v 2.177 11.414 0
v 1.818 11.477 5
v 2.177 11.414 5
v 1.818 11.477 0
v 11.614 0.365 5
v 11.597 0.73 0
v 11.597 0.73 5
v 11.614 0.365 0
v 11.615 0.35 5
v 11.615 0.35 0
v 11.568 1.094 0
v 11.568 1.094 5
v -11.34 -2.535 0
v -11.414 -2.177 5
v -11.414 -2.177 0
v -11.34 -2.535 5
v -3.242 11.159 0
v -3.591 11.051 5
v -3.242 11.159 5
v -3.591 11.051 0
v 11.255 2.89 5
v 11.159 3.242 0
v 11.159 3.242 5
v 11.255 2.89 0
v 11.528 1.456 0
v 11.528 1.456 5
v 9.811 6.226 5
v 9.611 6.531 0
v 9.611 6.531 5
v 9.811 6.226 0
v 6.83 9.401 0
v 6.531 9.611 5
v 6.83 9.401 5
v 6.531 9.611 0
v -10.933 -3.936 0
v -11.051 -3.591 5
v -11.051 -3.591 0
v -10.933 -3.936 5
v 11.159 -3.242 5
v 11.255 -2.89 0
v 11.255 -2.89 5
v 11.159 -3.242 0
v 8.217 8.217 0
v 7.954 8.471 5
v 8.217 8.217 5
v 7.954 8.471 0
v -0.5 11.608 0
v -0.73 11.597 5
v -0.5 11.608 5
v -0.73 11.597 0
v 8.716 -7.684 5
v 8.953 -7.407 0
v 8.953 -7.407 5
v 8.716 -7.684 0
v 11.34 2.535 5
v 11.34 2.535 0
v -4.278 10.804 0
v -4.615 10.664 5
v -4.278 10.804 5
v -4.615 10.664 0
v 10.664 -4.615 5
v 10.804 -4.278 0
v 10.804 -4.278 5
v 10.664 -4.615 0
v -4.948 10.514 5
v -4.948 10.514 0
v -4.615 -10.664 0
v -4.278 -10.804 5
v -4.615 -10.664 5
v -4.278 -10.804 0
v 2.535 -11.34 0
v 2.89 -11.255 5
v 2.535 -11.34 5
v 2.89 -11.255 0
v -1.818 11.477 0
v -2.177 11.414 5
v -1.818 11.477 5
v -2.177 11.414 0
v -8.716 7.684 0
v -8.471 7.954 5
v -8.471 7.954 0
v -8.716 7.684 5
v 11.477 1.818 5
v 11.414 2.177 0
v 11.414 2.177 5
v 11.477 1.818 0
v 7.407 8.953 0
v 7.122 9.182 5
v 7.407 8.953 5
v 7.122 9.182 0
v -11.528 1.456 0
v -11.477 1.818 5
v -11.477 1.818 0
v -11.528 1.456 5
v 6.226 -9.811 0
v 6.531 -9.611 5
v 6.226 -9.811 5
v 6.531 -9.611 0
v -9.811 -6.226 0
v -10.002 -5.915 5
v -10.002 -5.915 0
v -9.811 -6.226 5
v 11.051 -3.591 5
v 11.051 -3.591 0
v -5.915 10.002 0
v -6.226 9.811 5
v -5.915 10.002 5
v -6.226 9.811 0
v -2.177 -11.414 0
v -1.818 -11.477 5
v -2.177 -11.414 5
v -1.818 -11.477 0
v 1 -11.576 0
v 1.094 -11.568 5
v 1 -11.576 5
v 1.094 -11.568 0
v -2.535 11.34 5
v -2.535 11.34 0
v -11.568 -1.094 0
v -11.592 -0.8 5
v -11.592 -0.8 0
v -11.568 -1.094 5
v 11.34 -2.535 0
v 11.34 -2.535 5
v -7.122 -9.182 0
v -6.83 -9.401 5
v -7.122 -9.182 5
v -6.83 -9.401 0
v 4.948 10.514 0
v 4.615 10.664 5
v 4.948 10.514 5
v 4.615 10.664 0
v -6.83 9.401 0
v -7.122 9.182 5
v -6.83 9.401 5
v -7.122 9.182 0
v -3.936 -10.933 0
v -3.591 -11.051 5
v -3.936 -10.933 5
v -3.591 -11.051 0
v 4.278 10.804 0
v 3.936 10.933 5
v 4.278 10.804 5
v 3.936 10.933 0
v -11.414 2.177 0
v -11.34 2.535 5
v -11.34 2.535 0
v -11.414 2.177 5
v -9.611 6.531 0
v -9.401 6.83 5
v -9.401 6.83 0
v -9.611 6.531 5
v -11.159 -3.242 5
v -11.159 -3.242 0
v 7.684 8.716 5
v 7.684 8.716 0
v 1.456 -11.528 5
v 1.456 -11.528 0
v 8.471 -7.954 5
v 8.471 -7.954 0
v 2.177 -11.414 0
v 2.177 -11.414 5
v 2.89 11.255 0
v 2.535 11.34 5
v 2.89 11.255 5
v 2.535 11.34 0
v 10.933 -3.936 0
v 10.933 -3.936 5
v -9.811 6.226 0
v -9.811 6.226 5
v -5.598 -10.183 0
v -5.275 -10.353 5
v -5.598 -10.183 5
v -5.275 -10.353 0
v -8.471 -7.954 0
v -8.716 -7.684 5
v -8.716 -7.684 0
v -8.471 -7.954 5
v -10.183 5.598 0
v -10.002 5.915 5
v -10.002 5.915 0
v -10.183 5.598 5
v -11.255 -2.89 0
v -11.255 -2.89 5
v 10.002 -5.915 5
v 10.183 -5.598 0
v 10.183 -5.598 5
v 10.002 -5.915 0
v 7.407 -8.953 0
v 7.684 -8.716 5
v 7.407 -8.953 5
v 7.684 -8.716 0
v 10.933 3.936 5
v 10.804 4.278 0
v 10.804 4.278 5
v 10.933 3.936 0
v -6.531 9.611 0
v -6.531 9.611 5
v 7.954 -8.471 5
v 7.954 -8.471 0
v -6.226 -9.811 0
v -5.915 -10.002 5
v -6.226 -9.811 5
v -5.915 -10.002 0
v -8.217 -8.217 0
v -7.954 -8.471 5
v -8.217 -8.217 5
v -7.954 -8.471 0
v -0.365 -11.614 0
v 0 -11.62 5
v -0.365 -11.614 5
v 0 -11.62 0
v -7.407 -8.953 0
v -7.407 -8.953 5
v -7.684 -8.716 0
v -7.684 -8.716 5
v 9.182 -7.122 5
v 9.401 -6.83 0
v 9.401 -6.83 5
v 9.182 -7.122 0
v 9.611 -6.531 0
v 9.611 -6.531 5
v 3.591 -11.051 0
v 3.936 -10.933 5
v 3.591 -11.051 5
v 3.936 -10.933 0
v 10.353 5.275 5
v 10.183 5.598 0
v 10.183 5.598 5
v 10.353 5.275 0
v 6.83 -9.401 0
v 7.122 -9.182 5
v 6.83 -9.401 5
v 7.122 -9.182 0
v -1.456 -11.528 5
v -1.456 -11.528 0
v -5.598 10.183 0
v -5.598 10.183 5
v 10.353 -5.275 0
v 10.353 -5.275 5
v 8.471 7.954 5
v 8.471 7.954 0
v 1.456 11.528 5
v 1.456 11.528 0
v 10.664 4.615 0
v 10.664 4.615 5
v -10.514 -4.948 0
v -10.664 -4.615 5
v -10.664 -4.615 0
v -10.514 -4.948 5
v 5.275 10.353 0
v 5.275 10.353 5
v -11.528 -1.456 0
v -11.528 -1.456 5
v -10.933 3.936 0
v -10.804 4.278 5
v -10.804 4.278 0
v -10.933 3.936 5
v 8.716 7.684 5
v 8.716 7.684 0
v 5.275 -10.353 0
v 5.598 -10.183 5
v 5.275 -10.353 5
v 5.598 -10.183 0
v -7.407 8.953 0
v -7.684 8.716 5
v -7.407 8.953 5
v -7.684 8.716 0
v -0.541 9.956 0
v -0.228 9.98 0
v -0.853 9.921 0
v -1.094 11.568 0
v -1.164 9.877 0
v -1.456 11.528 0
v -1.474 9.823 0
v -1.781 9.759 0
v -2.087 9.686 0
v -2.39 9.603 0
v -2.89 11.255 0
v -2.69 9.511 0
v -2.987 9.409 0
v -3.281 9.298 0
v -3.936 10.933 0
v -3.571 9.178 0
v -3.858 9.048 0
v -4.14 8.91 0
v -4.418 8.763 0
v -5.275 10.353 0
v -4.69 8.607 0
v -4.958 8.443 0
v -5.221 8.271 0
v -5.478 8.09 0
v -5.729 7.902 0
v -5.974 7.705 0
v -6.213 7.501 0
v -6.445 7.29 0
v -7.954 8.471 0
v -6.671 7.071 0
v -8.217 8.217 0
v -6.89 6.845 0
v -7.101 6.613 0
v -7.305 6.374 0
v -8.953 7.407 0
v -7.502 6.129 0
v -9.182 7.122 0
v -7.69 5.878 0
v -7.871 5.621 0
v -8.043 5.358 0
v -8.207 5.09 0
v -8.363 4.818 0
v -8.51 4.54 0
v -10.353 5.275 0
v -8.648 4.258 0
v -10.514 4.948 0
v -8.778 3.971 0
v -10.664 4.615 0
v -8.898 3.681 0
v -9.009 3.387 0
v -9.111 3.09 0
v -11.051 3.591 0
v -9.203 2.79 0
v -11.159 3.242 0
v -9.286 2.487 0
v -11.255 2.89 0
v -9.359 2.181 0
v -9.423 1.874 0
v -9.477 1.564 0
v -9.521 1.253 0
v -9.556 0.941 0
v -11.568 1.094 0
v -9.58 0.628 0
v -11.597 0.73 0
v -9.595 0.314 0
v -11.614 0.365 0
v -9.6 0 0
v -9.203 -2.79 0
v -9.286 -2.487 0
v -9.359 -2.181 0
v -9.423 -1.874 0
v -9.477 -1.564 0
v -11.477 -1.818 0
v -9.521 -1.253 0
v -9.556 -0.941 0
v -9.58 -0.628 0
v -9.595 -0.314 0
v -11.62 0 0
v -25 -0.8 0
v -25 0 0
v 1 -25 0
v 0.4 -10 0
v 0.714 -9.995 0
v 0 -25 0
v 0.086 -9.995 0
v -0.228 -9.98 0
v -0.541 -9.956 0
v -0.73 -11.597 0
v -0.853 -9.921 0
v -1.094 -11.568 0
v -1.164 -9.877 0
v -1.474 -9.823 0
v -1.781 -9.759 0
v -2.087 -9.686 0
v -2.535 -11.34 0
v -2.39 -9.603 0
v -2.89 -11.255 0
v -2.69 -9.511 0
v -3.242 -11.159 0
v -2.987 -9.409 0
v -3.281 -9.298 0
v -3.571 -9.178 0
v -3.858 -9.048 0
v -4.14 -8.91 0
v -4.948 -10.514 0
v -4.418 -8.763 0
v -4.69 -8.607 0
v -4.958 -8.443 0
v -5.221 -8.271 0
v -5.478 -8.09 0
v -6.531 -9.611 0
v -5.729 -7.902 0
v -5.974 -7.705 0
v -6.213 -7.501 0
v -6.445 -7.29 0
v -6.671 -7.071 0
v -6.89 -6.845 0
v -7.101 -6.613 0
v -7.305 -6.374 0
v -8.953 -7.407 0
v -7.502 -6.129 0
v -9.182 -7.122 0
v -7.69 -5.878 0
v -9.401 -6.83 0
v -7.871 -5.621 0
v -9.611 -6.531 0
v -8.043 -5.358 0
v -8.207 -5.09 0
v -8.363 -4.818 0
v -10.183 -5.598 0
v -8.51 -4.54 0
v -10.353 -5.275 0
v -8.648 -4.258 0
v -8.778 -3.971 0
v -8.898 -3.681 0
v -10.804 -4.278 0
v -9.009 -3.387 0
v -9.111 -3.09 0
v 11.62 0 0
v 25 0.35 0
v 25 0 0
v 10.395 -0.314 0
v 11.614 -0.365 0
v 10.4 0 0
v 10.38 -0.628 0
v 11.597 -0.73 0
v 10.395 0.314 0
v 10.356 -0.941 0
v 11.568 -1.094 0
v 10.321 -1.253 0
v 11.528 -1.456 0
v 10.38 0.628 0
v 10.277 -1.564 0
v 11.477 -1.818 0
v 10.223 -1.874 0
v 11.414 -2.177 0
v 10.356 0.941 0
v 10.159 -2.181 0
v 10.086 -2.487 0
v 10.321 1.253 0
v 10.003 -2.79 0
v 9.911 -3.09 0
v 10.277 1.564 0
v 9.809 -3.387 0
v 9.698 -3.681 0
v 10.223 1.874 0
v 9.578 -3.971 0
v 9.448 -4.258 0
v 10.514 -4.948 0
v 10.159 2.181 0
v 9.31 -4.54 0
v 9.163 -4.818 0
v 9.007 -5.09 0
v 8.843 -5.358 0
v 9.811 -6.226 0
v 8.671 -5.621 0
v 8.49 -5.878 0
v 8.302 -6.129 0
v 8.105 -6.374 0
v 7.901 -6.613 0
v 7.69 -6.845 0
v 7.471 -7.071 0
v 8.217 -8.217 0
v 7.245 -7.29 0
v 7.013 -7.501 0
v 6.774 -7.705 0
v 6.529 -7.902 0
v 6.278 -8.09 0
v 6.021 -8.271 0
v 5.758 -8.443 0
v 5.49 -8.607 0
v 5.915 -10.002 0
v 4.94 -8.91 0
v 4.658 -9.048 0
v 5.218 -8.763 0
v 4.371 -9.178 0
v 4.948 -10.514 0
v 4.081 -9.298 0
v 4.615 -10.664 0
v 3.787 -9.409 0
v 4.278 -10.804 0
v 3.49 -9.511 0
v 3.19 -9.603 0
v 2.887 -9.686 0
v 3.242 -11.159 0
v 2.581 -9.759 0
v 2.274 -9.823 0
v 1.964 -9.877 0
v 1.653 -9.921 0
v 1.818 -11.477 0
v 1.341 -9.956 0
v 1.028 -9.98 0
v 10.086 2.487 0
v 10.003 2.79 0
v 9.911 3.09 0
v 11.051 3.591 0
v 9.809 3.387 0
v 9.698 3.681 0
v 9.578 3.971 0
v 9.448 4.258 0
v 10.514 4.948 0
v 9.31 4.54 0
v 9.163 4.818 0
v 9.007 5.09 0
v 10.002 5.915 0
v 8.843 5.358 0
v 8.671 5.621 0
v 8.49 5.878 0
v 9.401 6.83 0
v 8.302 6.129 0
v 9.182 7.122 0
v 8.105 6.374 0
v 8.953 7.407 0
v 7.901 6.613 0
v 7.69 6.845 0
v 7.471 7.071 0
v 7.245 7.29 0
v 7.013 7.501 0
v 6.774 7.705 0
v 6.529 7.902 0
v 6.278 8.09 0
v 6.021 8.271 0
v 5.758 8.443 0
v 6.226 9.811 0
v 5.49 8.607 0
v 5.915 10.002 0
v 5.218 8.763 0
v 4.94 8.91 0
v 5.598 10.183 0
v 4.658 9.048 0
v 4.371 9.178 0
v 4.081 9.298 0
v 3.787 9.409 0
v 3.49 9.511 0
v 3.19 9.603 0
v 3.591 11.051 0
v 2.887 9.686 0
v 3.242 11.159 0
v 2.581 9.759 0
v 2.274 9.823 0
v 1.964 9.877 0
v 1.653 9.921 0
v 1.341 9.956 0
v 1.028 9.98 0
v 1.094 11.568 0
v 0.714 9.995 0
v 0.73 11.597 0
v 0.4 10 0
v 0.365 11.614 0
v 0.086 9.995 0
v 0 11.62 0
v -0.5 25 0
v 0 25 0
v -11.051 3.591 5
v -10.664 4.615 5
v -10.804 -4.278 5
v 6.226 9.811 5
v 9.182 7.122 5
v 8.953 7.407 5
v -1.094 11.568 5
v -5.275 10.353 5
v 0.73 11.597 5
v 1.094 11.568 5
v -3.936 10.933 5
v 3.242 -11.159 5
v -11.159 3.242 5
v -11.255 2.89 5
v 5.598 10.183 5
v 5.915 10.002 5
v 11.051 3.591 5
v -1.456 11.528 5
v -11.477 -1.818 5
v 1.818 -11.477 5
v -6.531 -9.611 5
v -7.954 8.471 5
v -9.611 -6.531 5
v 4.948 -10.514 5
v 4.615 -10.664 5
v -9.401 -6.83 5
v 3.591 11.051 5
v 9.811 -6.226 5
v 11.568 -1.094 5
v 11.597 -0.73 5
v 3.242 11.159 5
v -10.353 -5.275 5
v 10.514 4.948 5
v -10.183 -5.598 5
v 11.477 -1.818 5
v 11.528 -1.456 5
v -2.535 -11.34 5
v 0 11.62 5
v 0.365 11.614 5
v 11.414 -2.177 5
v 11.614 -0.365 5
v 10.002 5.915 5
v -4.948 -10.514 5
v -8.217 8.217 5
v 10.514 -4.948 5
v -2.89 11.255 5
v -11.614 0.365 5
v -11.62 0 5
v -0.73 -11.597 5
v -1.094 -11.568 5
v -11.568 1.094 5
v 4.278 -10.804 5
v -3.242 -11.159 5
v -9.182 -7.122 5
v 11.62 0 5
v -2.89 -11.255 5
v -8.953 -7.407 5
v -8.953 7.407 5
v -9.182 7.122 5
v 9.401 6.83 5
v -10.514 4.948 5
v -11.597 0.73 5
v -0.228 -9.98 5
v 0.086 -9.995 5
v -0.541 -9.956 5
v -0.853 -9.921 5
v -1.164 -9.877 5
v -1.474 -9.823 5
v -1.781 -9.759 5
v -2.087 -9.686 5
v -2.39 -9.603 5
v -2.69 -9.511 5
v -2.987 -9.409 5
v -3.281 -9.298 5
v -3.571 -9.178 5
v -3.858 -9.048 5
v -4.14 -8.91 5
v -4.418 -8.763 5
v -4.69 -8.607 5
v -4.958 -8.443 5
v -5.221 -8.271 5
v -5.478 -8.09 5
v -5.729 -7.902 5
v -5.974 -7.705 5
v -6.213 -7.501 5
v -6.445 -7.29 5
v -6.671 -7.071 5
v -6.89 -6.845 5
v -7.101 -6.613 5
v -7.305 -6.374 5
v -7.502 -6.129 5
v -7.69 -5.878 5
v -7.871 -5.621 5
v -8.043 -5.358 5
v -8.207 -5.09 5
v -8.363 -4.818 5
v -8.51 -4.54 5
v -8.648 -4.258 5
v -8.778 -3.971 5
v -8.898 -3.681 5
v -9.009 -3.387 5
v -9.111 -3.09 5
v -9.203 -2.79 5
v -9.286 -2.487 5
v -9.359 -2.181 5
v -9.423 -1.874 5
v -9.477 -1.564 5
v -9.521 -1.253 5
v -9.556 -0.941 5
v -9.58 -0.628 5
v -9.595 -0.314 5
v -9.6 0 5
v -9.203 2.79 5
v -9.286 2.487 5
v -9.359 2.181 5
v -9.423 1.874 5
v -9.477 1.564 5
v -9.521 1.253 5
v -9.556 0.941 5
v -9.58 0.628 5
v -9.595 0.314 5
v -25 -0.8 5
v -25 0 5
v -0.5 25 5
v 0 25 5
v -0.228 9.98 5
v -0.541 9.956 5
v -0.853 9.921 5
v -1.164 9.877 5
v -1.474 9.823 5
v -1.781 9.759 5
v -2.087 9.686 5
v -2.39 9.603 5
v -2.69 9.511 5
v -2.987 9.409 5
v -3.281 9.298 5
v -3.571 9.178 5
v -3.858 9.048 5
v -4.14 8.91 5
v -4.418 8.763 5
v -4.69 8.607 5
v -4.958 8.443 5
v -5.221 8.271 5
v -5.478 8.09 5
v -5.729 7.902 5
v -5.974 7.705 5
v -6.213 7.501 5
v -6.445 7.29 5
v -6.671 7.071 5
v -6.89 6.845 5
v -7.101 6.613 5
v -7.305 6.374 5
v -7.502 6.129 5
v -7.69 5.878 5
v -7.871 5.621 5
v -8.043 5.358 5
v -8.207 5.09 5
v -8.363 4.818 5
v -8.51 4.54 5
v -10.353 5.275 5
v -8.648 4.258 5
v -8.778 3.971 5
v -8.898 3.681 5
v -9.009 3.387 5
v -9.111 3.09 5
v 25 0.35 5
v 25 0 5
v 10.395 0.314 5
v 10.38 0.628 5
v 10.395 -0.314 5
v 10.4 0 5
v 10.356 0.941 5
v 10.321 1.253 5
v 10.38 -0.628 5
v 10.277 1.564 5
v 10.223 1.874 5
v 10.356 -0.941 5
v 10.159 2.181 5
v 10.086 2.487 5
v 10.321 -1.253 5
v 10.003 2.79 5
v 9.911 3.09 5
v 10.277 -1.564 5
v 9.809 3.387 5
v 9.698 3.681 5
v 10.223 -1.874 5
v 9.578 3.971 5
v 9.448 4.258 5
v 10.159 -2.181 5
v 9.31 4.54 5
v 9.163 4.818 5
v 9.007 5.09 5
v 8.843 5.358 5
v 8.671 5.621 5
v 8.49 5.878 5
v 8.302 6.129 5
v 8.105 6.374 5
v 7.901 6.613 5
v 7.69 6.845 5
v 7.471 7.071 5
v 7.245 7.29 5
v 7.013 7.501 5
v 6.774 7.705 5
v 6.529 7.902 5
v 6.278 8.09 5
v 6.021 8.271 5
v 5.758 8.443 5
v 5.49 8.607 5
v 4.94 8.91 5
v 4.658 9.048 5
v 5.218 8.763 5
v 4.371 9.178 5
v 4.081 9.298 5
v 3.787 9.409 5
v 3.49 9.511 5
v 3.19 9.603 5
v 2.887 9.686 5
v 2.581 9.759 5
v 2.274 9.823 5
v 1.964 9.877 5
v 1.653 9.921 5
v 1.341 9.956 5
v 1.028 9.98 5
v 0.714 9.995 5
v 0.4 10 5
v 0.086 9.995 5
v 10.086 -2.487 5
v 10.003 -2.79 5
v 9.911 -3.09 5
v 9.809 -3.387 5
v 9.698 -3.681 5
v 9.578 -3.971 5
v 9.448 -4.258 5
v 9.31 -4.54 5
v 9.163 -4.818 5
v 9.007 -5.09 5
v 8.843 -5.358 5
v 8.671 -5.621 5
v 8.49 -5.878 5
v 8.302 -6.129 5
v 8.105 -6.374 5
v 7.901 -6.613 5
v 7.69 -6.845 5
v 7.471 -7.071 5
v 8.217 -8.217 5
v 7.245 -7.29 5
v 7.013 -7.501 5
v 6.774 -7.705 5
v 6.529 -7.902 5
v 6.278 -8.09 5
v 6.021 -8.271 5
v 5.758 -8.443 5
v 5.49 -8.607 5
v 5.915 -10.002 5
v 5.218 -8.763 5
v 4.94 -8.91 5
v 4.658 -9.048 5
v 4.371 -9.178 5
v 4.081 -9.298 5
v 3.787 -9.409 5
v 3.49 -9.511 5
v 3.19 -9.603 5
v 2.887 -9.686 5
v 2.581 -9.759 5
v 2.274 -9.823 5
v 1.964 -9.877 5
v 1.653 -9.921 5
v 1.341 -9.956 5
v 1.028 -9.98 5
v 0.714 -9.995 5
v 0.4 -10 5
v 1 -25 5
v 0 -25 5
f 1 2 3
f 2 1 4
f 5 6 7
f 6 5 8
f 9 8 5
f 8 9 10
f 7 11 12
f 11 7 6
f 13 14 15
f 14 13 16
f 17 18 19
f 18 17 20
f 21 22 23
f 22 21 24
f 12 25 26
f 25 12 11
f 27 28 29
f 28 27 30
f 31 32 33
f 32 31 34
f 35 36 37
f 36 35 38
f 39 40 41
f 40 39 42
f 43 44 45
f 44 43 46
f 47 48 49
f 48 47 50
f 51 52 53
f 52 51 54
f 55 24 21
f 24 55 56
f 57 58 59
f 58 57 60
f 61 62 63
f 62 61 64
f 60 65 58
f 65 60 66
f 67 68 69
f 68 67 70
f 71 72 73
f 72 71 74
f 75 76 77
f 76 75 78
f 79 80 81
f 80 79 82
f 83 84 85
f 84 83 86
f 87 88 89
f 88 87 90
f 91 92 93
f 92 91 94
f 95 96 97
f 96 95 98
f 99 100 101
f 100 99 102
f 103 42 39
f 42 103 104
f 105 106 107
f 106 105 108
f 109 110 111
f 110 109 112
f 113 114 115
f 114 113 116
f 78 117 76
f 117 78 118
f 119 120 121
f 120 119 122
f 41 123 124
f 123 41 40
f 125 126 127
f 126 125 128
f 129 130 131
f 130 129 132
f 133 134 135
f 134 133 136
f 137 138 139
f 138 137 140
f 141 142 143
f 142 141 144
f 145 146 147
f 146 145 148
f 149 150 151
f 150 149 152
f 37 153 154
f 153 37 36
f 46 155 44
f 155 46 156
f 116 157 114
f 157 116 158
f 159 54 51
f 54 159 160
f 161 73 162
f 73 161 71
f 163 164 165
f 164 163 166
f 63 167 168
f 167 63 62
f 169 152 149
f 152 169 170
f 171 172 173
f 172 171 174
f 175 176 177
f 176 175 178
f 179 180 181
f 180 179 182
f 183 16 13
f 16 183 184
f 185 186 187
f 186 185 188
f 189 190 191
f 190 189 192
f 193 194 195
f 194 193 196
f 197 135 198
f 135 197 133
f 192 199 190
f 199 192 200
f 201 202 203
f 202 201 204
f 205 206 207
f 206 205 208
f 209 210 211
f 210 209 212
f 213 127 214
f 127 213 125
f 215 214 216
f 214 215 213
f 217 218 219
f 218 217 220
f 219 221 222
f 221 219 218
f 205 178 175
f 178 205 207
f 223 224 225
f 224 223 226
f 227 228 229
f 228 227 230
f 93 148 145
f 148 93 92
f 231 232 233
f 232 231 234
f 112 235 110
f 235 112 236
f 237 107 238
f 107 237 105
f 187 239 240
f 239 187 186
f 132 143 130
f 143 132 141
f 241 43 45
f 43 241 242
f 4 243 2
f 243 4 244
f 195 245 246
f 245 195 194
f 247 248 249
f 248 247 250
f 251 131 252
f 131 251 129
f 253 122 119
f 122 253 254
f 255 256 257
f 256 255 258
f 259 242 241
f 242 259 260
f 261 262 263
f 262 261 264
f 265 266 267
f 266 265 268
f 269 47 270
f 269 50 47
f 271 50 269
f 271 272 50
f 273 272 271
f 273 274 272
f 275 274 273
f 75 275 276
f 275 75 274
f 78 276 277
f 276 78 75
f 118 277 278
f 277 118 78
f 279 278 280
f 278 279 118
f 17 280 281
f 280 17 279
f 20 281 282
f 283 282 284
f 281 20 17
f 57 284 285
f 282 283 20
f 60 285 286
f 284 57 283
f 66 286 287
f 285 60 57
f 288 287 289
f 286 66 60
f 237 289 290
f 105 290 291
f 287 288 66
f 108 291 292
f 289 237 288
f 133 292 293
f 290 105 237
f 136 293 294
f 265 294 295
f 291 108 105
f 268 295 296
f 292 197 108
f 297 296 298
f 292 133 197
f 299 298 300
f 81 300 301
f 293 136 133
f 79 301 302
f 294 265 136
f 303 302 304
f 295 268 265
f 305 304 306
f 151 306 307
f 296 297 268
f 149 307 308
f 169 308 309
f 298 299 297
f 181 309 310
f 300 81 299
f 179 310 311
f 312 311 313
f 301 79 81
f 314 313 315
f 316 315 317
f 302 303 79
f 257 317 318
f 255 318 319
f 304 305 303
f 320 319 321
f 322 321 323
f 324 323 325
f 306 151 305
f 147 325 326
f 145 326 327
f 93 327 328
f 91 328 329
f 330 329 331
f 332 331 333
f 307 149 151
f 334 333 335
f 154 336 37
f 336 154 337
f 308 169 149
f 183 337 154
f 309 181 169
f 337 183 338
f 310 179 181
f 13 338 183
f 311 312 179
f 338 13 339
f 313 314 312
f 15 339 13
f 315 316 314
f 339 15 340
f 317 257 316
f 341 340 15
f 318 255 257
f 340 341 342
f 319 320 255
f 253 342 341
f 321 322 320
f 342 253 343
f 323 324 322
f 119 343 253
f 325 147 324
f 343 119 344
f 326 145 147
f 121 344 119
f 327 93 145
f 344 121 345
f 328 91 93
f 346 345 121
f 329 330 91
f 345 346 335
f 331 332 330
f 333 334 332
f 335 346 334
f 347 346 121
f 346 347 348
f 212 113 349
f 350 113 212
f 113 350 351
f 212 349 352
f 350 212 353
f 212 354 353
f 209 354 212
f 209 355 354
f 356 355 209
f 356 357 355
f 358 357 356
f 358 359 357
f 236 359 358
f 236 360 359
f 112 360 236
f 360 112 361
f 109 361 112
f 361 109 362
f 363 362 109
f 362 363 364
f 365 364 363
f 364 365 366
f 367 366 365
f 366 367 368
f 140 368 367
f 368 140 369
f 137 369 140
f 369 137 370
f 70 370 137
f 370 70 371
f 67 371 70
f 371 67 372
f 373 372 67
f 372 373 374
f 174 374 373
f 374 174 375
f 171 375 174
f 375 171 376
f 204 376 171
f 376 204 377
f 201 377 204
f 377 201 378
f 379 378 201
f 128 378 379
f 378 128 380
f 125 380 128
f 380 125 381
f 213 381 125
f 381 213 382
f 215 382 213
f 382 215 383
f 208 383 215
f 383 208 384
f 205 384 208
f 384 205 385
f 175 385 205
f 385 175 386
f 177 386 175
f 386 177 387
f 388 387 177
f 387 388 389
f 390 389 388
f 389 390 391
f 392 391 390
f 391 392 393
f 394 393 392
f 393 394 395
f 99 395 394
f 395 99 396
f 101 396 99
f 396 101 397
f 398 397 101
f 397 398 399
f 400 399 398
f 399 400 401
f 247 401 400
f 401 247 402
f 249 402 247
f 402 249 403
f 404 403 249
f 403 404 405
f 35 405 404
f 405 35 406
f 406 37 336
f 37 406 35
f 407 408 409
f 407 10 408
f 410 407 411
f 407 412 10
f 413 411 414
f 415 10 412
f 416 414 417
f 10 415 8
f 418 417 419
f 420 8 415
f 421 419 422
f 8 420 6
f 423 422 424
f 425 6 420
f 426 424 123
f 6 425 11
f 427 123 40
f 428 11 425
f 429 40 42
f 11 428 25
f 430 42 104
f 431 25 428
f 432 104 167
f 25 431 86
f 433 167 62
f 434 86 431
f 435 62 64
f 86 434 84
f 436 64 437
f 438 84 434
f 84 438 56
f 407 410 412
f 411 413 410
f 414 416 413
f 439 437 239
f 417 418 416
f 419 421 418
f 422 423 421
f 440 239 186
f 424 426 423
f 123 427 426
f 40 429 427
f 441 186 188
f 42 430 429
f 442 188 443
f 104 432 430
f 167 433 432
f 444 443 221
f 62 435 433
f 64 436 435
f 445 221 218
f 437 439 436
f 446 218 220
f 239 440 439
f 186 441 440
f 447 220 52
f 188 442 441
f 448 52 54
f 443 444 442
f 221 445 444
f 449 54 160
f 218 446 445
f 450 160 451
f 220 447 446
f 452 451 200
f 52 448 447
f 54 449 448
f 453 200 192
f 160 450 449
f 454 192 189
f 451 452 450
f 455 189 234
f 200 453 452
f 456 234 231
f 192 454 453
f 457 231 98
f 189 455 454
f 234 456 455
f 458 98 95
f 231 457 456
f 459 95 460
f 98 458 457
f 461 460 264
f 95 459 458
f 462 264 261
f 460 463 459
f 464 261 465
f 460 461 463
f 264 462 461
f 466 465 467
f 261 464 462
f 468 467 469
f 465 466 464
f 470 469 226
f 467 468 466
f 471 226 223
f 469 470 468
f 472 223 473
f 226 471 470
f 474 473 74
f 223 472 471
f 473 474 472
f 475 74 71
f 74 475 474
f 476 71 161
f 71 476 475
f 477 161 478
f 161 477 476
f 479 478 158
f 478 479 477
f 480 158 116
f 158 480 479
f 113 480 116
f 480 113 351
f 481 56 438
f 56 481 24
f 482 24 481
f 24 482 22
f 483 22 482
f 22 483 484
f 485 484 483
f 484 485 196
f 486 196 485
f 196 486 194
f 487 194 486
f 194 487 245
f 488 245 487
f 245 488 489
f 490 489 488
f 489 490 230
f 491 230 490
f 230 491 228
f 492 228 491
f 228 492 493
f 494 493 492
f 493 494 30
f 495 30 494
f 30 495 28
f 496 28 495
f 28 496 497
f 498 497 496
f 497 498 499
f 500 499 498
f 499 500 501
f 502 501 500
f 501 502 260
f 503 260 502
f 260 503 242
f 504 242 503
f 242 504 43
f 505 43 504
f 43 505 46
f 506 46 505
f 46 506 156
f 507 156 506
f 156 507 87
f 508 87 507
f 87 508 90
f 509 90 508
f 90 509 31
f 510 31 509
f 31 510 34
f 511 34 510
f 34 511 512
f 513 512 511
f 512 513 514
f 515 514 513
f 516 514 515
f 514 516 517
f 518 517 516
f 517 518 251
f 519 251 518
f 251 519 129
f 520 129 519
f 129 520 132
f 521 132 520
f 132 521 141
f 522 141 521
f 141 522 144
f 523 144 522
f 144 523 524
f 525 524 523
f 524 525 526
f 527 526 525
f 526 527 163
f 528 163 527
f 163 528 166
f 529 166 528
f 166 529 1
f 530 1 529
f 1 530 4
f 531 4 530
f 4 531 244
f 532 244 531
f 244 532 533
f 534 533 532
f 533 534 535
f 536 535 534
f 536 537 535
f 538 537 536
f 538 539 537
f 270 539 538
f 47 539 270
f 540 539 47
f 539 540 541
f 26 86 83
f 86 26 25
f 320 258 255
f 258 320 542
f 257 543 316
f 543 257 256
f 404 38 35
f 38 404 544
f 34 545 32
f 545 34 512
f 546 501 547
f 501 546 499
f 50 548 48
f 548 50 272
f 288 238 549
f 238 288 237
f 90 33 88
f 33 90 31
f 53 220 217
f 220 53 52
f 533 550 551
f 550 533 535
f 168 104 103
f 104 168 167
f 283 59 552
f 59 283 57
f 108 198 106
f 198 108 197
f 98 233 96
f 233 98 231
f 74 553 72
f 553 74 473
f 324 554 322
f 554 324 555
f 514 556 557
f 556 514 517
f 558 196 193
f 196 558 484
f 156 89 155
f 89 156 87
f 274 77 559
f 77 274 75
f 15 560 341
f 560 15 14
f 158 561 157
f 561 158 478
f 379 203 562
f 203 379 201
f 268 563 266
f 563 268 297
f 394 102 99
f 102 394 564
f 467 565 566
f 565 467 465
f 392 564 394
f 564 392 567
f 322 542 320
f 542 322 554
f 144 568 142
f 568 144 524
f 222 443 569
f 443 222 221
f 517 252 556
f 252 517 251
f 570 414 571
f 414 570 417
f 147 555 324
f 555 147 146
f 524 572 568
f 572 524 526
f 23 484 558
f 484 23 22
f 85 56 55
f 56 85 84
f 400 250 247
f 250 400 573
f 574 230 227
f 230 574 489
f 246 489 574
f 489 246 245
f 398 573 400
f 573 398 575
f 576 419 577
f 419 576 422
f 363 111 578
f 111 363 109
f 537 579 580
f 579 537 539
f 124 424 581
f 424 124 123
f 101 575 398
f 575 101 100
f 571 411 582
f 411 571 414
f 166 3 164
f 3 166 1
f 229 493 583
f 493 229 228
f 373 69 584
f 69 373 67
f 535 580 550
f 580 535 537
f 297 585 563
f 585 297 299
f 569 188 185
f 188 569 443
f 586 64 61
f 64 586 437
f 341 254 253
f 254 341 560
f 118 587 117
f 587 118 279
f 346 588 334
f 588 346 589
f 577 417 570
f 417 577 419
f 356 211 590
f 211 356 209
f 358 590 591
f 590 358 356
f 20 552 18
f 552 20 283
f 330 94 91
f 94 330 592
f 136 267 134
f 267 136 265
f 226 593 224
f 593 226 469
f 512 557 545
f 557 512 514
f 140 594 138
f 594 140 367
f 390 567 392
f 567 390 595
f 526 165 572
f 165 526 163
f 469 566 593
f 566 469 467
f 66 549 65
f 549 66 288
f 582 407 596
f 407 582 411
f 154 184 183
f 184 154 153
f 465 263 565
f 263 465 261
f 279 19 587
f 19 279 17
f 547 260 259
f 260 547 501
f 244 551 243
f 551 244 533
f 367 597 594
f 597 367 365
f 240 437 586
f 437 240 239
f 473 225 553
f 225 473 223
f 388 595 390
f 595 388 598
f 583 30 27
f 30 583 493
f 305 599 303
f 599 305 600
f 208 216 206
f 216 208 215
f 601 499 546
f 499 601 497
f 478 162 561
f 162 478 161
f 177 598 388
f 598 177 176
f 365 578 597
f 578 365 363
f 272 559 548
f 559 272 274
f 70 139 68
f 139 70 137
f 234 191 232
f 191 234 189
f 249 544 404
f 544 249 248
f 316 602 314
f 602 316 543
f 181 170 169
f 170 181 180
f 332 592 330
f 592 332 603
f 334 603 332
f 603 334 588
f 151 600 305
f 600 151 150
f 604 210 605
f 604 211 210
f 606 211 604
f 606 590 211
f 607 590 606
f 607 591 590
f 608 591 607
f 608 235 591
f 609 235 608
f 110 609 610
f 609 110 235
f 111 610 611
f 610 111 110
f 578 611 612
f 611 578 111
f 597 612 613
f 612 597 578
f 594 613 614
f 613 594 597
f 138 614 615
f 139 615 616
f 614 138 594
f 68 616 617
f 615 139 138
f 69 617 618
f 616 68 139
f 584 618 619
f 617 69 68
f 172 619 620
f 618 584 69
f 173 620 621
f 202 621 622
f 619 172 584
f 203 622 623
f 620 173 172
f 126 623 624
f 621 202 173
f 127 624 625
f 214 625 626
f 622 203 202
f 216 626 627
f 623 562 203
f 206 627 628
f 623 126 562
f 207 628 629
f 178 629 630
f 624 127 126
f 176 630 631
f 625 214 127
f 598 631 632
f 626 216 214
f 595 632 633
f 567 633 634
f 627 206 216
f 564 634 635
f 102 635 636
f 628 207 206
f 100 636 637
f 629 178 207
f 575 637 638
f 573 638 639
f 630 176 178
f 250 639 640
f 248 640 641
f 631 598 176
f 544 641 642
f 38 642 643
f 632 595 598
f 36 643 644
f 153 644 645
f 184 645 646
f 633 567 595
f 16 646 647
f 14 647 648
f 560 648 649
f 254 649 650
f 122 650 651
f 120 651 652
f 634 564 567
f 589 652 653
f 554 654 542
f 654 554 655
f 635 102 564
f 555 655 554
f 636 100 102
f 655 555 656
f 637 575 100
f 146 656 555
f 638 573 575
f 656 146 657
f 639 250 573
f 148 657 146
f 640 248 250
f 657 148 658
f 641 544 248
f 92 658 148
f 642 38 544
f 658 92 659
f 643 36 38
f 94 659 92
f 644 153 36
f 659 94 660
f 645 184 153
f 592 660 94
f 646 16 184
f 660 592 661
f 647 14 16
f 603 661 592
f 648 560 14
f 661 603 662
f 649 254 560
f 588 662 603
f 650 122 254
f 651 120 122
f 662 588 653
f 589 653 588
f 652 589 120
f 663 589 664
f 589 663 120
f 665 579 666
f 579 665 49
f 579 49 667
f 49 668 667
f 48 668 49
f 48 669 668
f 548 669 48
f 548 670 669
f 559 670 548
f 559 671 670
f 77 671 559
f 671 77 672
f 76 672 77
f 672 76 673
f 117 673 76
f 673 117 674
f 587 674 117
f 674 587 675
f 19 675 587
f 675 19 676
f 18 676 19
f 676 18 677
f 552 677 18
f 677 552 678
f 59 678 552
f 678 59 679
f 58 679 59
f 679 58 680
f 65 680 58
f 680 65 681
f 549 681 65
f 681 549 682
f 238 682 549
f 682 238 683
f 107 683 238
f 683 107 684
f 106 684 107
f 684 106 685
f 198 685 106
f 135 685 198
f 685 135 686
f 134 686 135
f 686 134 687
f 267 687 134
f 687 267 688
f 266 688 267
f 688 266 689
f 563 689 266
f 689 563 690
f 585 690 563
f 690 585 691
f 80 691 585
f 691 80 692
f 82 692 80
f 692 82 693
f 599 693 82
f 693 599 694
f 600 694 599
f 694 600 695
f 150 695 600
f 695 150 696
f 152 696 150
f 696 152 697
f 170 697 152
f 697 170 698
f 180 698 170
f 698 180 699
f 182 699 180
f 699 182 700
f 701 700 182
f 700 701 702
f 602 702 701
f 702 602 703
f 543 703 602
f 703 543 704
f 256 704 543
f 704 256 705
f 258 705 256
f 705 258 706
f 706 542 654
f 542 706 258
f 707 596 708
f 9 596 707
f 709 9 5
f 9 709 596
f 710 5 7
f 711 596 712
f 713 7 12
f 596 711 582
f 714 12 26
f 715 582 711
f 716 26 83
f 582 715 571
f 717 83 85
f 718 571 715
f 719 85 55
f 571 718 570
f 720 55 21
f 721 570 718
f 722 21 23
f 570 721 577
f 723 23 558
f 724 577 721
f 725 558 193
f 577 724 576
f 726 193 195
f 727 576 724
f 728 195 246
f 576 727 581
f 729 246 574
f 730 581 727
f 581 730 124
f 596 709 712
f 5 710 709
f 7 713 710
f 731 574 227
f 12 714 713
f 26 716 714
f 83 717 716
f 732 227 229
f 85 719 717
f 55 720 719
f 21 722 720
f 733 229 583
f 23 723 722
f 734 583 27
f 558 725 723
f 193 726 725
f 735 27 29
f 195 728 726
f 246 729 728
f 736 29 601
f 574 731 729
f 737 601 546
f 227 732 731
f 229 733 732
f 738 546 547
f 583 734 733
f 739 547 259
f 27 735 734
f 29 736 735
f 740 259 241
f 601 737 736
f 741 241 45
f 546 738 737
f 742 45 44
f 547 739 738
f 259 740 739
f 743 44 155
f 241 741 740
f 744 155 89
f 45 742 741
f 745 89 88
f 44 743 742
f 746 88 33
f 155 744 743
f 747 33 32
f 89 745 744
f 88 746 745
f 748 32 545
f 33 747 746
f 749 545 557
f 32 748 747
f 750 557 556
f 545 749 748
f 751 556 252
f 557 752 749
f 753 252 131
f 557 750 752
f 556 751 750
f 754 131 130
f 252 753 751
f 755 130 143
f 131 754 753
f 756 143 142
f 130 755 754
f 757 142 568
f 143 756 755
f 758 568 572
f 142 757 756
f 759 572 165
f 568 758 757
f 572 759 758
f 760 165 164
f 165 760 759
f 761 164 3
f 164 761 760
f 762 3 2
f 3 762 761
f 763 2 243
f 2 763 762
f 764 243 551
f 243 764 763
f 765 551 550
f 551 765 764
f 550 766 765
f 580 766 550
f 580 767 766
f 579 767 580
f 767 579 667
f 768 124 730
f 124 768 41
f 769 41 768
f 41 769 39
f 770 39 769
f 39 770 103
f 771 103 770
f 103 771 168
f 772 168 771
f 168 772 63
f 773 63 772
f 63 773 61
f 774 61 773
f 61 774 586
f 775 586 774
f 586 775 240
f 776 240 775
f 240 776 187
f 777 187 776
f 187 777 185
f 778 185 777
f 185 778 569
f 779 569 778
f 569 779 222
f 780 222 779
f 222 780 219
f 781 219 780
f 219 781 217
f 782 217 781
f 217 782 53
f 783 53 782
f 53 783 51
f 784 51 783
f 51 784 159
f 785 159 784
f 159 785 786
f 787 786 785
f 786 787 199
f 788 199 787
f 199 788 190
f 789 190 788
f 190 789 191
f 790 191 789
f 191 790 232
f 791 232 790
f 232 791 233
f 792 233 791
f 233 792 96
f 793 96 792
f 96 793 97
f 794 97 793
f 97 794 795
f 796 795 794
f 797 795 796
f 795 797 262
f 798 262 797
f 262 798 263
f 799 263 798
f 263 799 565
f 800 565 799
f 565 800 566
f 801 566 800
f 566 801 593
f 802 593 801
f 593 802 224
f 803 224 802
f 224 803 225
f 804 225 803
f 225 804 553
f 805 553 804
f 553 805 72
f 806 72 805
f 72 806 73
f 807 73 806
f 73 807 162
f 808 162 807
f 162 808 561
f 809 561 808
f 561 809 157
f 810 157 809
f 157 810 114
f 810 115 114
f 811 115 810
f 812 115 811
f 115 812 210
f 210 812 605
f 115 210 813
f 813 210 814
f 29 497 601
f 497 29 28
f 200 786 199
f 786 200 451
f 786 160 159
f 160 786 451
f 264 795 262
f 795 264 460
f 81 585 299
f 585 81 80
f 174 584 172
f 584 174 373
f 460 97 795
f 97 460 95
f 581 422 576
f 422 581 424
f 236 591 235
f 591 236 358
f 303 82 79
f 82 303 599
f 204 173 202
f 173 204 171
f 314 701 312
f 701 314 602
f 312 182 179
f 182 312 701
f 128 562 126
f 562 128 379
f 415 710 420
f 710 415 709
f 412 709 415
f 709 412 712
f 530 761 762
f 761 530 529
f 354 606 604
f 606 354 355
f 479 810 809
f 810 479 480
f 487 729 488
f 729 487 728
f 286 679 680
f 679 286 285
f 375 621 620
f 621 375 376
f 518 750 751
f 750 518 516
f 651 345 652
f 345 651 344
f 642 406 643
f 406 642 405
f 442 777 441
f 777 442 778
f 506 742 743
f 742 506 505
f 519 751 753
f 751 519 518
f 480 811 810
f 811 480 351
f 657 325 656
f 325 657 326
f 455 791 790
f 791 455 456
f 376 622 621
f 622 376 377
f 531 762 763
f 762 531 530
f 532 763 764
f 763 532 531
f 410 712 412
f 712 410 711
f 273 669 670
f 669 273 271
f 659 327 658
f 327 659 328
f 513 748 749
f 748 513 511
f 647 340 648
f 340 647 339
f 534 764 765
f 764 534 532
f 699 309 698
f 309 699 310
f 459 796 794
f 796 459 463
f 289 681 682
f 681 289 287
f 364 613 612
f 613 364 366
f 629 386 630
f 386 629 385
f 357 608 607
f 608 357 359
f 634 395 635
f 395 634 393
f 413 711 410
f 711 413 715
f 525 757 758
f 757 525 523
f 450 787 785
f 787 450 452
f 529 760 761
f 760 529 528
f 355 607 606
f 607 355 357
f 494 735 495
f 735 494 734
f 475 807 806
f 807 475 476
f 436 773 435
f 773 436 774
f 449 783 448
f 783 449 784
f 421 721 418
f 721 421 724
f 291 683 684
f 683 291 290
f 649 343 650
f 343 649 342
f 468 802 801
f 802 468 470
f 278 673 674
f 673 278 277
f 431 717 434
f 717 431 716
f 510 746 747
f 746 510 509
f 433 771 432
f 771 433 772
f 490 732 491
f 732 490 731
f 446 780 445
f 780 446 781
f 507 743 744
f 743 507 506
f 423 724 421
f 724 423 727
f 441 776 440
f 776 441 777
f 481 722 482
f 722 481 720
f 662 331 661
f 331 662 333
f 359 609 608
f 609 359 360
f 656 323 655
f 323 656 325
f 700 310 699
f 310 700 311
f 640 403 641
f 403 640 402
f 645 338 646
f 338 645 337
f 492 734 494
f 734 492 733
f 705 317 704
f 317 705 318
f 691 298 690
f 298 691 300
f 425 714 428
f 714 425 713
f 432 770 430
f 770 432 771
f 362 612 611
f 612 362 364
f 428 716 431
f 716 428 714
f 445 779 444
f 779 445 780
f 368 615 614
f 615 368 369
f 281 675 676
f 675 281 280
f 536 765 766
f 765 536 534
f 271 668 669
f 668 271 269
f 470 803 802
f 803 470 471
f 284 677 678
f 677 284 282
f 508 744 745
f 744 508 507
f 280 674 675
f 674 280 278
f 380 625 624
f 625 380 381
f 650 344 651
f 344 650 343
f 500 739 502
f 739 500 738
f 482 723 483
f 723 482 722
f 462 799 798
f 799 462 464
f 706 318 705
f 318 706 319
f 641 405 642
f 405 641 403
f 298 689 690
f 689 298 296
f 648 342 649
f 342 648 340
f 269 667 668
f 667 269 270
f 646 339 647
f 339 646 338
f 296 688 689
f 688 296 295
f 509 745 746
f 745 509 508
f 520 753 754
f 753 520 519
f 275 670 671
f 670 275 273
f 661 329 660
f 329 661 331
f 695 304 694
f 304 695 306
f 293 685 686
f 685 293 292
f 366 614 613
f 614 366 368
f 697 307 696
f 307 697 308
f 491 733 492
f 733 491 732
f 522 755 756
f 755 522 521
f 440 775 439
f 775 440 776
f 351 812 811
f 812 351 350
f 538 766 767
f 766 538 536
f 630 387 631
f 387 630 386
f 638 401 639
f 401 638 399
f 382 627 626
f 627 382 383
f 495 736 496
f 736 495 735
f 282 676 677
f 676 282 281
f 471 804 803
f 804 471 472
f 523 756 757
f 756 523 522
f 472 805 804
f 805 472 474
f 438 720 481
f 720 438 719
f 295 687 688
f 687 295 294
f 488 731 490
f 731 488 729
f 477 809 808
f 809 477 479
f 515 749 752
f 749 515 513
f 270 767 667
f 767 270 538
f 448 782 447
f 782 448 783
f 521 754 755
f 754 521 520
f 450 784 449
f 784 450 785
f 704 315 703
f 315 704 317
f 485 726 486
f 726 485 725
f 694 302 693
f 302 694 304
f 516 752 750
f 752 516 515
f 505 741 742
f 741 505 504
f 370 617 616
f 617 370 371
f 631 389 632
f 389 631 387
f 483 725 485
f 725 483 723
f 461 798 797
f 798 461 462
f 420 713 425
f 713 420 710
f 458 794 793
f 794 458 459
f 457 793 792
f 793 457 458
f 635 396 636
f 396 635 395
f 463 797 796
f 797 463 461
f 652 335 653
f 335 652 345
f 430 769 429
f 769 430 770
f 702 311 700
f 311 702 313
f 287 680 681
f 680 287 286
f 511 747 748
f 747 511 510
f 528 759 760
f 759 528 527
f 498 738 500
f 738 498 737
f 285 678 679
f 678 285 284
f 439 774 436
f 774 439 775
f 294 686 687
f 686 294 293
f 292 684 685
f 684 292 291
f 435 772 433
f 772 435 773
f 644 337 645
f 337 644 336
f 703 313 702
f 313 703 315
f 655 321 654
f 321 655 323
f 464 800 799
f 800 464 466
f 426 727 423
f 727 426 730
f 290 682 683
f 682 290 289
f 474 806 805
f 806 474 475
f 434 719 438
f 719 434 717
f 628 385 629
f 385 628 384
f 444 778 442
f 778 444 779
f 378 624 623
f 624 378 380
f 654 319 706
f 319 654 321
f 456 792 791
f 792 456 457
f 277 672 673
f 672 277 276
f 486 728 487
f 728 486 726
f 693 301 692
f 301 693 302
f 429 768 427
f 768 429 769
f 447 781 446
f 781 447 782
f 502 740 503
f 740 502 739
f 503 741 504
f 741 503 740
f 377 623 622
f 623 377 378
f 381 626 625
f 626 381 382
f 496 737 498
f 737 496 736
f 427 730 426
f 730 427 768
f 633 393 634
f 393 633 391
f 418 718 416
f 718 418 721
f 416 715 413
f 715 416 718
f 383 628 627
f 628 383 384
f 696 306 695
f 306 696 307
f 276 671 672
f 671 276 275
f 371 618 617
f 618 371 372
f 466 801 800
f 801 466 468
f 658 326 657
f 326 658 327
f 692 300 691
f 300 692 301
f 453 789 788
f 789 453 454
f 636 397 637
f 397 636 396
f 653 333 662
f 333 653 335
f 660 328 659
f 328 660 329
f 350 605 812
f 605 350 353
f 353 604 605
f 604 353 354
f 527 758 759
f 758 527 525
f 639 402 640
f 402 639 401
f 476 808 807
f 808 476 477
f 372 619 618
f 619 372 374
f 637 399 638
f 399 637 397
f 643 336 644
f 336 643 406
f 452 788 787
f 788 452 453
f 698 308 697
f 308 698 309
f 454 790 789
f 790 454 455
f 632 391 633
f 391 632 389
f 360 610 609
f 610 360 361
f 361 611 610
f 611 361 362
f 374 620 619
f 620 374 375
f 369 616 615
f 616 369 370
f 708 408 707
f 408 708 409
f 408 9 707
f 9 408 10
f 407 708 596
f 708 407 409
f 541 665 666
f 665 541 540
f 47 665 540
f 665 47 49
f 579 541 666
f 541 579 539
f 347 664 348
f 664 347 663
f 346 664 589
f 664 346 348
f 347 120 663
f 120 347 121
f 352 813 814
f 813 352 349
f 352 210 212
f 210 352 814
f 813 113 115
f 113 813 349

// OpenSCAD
// 5@xes Thin Part Test 2020
// Thichness 
//   - 0.35
//   - 0.5
//   - 0.8
//   - 1

$fn=200;

union () {
    translate([11,0,0]) cube([14,0.35,5], center = false);
    translate([0,11,0]) rotate(90, [0,0,1]) cube([14,0.5,5], center = false);
    translate([-11,0,0]) rotate(180, [0,0,1]) cube([14,0.8,5], center = false);
    translate([0,-11,0]) rotate(-90, [0,0,1]) cube([14,1,5], center = false);
    difference() {
        cylinder(r=11.62, h=5);
        translate([0.4,0,-1]) cylinder(r=10, h=10);
    }
}
